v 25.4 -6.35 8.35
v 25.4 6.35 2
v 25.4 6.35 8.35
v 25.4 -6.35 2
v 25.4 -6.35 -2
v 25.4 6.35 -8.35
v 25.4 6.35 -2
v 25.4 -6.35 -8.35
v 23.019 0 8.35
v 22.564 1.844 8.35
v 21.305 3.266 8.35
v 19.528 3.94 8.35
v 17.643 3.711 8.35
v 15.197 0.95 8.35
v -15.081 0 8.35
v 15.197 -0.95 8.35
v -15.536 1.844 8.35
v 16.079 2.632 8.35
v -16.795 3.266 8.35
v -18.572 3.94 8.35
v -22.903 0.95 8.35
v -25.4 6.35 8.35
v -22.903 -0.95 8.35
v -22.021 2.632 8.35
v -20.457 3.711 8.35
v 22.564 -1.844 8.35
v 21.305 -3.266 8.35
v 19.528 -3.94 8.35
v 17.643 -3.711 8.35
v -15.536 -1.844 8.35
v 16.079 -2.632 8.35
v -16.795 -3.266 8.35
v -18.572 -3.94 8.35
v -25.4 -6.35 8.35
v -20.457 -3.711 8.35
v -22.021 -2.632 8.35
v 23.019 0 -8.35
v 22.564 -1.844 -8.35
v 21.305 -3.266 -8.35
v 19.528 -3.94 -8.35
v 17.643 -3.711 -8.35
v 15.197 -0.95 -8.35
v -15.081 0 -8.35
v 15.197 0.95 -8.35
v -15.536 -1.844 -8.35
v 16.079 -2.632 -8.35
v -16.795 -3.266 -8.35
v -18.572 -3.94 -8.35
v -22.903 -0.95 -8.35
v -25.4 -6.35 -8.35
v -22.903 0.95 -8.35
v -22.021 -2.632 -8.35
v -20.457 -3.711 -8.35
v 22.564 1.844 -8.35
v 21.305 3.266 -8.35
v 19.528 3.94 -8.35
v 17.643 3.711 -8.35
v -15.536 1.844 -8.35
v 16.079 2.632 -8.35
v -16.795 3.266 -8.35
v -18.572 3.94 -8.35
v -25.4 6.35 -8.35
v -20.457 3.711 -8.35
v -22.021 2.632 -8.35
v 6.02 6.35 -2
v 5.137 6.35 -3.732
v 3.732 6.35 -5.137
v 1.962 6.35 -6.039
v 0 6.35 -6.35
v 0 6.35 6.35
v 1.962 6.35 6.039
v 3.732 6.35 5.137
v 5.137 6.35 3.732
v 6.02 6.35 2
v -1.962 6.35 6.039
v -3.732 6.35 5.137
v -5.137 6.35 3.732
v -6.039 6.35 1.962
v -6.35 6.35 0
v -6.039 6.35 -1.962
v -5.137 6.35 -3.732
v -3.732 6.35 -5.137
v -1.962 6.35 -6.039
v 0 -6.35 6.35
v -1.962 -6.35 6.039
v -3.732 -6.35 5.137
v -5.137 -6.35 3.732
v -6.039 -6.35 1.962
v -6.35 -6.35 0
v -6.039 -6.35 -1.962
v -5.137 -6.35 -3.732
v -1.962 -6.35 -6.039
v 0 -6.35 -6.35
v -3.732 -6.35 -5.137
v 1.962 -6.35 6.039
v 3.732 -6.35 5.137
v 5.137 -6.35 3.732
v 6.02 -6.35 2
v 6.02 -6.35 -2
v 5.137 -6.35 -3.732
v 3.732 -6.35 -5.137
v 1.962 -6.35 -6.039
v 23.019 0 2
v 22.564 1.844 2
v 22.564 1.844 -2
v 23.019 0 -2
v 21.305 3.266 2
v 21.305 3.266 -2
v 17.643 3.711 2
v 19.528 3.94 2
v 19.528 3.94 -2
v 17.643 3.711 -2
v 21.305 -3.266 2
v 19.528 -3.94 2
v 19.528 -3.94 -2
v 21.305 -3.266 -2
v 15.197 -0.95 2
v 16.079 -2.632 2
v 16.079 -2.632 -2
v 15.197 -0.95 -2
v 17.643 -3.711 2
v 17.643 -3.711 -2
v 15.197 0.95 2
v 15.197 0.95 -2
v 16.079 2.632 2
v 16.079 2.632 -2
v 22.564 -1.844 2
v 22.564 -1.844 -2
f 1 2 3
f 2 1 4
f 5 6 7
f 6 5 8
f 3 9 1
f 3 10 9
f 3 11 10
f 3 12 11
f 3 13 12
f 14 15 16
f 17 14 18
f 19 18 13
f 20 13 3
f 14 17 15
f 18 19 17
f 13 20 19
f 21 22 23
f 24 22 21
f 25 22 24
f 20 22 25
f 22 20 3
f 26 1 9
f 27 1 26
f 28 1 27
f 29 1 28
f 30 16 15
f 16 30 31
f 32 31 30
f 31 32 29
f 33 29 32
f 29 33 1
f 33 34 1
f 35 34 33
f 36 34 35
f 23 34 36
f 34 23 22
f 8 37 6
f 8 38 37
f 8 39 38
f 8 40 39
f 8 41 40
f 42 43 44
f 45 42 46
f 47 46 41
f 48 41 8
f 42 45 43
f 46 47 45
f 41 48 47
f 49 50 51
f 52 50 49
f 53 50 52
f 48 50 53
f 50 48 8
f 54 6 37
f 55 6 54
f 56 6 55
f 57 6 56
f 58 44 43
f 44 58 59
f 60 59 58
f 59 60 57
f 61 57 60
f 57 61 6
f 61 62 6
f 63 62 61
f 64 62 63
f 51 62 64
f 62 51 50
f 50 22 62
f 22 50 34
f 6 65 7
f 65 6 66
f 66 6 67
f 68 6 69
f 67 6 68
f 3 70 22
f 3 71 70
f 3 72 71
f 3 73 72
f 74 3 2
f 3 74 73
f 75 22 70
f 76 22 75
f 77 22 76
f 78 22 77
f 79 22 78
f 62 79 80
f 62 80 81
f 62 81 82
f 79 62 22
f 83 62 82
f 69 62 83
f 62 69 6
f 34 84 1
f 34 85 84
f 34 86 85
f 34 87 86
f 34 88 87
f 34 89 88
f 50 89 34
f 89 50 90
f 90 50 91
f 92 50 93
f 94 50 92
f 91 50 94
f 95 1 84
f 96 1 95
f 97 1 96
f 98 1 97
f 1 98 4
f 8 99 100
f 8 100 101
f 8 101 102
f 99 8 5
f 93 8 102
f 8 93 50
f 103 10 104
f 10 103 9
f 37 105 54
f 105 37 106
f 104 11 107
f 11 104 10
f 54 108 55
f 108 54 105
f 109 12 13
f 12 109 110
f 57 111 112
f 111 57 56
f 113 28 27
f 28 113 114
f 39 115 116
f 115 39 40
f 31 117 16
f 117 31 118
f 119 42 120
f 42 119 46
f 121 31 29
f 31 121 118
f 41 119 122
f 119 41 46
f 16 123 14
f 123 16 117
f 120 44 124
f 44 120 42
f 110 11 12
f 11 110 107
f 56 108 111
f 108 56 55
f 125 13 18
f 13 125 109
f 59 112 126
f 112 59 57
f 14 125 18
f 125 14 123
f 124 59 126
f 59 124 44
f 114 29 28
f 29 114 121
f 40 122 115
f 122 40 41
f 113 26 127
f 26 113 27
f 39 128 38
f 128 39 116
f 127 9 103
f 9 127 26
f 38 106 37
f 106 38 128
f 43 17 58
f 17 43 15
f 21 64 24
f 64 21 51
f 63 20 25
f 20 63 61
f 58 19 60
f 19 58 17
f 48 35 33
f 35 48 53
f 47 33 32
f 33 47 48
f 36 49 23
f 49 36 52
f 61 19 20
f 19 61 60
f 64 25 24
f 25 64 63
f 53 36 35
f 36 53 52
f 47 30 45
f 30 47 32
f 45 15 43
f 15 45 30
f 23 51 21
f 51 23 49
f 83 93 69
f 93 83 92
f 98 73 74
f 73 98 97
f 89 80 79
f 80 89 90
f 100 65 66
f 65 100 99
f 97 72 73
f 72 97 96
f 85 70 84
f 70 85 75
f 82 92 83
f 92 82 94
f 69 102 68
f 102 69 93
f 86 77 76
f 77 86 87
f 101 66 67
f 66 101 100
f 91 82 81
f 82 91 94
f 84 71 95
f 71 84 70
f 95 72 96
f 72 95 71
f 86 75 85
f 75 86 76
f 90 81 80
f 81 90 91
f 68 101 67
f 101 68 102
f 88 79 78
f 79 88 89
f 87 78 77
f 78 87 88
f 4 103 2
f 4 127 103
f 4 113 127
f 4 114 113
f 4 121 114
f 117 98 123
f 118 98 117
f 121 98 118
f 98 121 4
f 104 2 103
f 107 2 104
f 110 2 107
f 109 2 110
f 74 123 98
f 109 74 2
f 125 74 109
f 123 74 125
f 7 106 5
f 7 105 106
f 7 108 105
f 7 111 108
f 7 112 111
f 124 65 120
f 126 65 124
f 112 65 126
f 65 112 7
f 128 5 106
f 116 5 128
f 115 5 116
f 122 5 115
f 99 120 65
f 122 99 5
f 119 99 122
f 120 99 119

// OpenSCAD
/*
    This program is free software: you can redistribute it and/or modify
    it under the terms of the GNU General Public License as published by
    the Free Software Foundation, either version 3 of the License, or
    (at your option) any later version.

    This program is distributed in the hope that it will be useful,
    but WITHOUT ANY WARRANTY; without even the implied warranty of
    MERCHANTABILITY or FITNESS FOR A PARTICULAR PURPOSE.  See the
    GNU General Public License for more details.

    You should have received a copy of the GNU General Public License
    along with this program.  If not, see <http://www.gnu.org/licenses/>
*/

bolt_diameter = 5/16 * 25.4;
bar_diameter = 25.4/2;
bolt_spacing = 1.5 * 25.4;
split_width = 4;
block_width = 25.4 / 2;

difference() {
cube ( [bolt_spacing + block_width, block_width, bar_diameter +split_width], center = true );
  translate( [bolt_spacing / 2,0,0] ) {
    cylinder ( h = bar_diameter + split_width + 2, r = bolt_diameter / 2, center = true);
  }
  translate( [-bolt_spacing / 2,0,0] ) {
    cylinder ( h = bar_diameter + split_width + 2, r = bolt_diameter / 2, center = true);
  }
  rotate( [90,0,0]) {
    cylinder ( h = block_width + 2, r = bar_diameter / 2, center = true);
  }
  translate([bolt_spacing / 4 + block_width / 4, 0, 0]) {
    cube([bolt_spacing / 2 + block_width / 2 + 2, block_width + 2, split_width], center = true);
  }
};
